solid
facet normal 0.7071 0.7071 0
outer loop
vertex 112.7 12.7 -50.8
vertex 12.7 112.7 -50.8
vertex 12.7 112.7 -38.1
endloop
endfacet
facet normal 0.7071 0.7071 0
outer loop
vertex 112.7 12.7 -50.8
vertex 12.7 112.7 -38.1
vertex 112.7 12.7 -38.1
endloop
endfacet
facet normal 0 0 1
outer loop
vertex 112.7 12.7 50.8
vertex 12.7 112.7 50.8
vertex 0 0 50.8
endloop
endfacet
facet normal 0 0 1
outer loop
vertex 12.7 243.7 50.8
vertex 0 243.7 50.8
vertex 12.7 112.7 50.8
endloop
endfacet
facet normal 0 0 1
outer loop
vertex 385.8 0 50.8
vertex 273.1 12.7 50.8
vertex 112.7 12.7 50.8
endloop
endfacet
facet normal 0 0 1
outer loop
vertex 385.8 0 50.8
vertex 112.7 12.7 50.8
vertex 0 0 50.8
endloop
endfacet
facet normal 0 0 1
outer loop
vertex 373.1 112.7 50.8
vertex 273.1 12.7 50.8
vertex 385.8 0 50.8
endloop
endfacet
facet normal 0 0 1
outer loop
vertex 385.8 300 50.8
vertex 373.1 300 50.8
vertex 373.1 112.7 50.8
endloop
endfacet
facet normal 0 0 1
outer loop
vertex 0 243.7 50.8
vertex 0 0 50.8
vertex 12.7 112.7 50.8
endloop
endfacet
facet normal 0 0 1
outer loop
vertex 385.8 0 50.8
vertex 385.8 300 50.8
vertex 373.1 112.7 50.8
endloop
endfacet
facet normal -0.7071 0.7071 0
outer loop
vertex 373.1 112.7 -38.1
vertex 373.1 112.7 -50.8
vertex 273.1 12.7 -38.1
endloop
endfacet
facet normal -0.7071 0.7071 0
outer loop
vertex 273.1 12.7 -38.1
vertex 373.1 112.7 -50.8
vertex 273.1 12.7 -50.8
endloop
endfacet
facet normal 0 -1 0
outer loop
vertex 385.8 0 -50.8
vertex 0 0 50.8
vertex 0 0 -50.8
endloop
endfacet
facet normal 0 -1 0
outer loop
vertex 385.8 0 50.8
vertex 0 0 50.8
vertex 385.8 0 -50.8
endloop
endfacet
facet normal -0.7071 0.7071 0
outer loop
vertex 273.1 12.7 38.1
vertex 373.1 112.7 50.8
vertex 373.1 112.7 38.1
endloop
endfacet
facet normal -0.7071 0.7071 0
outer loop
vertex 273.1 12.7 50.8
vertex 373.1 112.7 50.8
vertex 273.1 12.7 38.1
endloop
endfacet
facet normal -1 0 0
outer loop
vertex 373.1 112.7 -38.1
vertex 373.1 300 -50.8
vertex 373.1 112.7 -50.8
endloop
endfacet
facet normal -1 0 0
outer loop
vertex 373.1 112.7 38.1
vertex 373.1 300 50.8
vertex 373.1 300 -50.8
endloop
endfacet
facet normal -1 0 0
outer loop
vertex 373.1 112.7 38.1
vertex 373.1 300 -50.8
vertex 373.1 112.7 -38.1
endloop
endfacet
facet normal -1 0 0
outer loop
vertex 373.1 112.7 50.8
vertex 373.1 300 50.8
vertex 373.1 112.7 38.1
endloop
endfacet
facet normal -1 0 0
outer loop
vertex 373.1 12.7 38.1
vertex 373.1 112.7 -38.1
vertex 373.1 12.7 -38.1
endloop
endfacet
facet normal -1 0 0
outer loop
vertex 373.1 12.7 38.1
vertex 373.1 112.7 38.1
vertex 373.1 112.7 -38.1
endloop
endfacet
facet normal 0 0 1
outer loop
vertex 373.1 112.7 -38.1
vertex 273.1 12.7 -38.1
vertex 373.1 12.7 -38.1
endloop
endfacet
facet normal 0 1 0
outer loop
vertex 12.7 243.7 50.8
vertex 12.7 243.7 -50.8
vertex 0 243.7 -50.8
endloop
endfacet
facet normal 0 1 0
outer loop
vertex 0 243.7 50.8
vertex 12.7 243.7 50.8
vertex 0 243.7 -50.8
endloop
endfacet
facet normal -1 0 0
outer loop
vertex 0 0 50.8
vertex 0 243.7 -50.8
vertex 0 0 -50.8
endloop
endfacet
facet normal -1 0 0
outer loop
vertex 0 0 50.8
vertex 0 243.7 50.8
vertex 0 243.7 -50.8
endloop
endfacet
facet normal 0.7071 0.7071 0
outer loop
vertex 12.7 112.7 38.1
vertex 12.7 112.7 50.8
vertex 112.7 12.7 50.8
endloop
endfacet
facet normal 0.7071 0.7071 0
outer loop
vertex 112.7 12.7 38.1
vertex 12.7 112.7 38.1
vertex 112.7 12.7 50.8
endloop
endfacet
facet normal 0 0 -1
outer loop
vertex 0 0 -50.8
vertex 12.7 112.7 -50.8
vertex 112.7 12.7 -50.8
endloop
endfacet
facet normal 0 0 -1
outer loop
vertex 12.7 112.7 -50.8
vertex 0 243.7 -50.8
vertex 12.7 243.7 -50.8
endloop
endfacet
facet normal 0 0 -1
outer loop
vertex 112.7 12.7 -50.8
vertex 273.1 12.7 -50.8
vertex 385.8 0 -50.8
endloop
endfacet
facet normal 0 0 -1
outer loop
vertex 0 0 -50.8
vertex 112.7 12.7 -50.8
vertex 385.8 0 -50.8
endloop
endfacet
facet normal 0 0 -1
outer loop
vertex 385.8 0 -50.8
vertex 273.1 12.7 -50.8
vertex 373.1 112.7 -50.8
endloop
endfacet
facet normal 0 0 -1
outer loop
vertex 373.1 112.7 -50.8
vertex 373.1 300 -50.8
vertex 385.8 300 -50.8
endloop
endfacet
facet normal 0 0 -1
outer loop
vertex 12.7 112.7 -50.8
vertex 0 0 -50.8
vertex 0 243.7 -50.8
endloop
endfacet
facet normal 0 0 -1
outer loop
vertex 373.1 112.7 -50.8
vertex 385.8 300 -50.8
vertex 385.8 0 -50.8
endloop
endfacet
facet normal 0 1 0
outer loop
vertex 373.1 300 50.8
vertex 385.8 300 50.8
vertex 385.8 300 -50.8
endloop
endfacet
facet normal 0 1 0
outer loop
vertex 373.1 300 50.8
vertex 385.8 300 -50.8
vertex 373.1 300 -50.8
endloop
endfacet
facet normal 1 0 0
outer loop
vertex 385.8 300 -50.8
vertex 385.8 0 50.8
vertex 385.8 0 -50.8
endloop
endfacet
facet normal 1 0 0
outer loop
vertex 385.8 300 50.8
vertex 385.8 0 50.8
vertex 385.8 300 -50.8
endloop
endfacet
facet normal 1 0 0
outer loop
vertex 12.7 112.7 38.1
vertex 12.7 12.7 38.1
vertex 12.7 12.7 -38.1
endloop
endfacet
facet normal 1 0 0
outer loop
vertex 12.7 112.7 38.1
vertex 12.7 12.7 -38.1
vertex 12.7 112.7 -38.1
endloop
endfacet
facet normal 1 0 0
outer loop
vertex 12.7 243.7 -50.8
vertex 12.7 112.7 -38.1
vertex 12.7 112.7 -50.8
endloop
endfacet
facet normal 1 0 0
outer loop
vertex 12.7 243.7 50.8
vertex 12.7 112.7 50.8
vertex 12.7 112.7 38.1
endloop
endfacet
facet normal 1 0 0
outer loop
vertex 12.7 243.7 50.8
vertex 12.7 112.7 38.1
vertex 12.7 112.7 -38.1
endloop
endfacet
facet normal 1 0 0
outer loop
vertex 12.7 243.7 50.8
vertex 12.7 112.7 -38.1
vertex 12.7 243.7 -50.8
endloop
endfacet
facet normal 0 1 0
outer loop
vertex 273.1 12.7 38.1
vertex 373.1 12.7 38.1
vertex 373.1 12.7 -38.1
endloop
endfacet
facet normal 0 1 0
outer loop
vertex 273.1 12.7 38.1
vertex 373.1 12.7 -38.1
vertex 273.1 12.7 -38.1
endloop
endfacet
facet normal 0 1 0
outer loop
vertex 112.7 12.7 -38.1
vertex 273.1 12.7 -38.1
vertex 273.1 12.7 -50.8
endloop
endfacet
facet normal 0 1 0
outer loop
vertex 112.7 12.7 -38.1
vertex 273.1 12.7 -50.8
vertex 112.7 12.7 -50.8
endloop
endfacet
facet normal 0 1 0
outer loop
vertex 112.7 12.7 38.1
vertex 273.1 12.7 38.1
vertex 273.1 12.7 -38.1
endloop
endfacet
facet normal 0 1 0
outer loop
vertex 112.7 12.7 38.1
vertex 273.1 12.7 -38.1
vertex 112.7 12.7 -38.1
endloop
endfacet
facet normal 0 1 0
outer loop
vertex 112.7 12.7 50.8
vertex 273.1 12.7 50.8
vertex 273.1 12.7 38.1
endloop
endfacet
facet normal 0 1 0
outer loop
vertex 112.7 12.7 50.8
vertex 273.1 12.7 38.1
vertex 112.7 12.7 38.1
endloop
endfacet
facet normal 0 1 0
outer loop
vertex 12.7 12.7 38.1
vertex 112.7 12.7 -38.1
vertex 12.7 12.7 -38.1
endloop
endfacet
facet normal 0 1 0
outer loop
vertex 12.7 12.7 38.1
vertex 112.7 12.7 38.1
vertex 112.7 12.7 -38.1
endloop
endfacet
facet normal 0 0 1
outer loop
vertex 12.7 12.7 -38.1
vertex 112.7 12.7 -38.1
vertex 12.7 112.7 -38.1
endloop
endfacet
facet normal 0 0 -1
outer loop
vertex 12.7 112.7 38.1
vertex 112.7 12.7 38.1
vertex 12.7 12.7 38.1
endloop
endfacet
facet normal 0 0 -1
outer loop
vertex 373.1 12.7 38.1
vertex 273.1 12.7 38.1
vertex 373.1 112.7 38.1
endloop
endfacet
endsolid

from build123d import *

# Parameters (mm, degrees)
BOSS_EXTRUDE1_DEPTH = 50.8
BOSS_EXTRUDE2_DEPTH = 12.7


with BuildPart() as part:
    # Sketch1 → Boss-Extrude1 (new, symmetric)
    with BuildSketch(Plane.XY):
        Polygon((0, 0), (385.8, 0), (385.8, 300), (373.1, 300), (373.1, 12.7), (12.7, 12.7), (12.7, 243.7), (0, 243.7), (0, 12.7), align=None)
    extrude(amount=BOSS_EXTRUDE1_DEPTH, both=True)

    # Sketch2 → Boss-Extrude2 (add)
    with BuildSketch(Plane.XY.offset(50.8)):
        Polygon((373.1, 112.7), (273.1, 12.7), (373.1, 12.7), align=None)
        Polygon((12.7, 12.7), (12.7, 112.7), (112.7, 12.7), align=None)
    boss_extrude2 = extrude(amount=-BOSS_EXTRUDE2_DEPTH)

    # Mirror1: Boss-Extrude2 across plane
    add(boss_extrude2.mirror(Plane.XY))


solid = part.part
